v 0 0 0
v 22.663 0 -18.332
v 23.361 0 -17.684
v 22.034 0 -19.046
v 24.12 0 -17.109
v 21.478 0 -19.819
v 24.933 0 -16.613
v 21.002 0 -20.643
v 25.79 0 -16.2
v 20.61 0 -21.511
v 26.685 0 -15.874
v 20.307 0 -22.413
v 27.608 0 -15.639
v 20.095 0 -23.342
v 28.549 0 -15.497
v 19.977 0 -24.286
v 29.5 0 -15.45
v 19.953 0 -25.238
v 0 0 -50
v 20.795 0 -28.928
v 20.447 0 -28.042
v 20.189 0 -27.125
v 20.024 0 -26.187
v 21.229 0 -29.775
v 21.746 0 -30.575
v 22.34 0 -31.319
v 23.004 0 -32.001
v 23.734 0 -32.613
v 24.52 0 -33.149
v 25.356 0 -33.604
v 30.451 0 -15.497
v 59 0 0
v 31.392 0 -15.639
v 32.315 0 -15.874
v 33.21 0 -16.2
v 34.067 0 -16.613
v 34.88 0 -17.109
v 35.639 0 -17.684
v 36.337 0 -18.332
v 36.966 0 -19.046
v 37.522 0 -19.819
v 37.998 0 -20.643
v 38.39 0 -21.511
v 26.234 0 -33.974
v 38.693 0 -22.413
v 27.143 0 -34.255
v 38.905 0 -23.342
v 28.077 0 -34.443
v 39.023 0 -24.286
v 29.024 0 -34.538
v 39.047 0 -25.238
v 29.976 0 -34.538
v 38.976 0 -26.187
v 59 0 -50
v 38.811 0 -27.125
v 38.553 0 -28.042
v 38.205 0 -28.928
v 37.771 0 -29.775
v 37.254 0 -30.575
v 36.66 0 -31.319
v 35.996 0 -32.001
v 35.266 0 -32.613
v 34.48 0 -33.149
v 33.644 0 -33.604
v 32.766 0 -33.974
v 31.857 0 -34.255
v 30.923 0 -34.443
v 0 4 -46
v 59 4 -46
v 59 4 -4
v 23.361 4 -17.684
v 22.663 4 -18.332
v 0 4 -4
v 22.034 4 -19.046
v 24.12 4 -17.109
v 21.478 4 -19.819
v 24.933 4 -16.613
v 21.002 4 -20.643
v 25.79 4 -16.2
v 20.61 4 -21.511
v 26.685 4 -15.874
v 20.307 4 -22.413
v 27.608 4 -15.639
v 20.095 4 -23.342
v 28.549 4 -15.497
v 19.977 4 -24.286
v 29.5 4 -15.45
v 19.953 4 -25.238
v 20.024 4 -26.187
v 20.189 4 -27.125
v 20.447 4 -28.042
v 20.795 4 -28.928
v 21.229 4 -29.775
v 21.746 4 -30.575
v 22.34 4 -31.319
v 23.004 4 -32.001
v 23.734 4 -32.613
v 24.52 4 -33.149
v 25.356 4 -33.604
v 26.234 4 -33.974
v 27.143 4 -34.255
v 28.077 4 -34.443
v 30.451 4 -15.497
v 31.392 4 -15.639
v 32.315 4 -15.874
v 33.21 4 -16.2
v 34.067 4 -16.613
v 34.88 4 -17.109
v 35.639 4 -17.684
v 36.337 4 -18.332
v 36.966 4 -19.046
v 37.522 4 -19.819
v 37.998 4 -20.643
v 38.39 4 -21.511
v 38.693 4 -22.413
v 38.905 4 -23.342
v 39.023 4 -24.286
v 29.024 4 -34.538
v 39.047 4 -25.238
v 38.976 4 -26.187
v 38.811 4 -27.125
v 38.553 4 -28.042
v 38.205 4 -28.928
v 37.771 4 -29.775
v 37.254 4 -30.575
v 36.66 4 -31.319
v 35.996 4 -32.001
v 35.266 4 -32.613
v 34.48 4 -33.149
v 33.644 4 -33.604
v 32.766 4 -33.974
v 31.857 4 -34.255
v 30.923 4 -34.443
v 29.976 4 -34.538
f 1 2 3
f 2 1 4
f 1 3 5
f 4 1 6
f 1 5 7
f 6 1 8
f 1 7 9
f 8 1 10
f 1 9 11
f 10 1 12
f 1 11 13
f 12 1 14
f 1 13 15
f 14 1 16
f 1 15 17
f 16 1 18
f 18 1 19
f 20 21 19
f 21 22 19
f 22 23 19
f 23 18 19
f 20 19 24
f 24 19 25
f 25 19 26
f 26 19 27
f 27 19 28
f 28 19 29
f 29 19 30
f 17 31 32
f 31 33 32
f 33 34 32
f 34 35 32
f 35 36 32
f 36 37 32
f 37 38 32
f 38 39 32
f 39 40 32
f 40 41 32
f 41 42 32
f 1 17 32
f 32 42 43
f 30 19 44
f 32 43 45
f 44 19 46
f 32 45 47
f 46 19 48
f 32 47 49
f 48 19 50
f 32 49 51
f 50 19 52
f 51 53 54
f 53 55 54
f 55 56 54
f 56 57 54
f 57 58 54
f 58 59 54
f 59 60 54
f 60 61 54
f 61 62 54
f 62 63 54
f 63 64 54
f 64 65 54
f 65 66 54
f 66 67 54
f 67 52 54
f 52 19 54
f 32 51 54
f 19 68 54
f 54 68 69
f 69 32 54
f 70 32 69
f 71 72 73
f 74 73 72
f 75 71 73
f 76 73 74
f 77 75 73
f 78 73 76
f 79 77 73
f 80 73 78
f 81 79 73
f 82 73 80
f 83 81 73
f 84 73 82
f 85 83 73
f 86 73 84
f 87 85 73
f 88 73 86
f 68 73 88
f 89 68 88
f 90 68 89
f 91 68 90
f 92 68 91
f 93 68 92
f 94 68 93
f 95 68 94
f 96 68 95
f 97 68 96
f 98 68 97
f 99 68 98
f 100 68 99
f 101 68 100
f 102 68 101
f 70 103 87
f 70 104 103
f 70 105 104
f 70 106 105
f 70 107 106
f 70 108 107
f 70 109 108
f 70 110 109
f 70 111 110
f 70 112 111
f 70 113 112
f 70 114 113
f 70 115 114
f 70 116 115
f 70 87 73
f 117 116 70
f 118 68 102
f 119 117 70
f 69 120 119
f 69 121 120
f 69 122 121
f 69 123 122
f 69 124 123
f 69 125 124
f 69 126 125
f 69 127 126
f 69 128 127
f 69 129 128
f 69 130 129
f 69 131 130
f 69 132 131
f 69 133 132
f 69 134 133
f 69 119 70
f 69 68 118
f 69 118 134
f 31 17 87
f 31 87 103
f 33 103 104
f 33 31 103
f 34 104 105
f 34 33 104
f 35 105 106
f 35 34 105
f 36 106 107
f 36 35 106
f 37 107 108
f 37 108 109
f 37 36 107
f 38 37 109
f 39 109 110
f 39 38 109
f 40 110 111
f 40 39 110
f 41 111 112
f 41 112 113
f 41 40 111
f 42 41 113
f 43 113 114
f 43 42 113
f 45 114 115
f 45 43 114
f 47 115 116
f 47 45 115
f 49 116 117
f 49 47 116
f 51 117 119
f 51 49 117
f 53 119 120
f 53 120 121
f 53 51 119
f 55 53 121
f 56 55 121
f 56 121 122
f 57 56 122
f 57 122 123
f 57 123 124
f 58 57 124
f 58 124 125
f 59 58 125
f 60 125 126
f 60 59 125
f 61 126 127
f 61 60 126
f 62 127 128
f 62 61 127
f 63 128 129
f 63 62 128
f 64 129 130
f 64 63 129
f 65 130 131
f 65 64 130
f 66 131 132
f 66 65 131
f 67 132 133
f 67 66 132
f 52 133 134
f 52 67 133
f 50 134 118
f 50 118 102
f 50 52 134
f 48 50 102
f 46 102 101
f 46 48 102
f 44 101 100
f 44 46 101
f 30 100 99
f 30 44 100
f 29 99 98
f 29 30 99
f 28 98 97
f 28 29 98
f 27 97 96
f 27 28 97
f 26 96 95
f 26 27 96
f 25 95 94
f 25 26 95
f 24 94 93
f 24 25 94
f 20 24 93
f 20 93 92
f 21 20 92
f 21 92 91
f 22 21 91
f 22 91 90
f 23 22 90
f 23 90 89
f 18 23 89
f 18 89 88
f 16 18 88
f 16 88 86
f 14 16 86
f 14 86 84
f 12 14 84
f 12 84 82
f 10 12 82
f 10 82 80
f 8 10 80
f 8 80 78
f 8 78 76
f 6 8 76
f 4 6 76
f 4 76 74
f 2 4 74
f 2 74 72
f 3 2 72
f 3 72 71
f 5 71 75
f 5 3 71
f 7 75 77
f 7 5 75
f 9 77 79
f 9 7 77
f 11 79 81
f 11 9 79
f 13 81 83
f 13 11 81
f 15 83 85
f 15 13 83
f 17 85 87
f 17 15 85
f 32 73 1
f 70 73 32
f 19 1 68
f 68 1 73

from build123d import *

# Parameters (mm, degrees)
SKETCH1_W           = 59
SKETCH1_H           = 50
SKETCH1_R           = 9.55
BOSS_EXTRUDE1_DEPTH = 4
CHAMFER1_SIZE       = 4


with BuildPart() as part:
    # Sketch1 → Boss-Extrude1 (new body)
    with BuildSketch(Plane(origin=(0, 0, 0), x_dir=(1, 0, 0), z_dir=(0, 1, 0))):
        with Locations((29.5, 25)):
            Rectangle(SKETCH1_W, SKETCH1_H)
        with Locations(Location((29.5, 25, 0), (0, 0, 270))):
            Circle(SKETCH1_R, mode=Mode.SUBTRACT)
    extrude(amount=BOSS_EXTRUDE1_DEPTH)

    # Chamfer1
    chamfer1_edges = [part.edges().sort_by_distance(p)[0] for p in [
        (29.5, 4, -50),
        (29.5, 4, 0),
    ]]
    chamfer(chamfer1_edges, length=CHAMFER1_SIZE - 0.0001)  # a hair under: the kernel refuses the full size


solid = part.part
